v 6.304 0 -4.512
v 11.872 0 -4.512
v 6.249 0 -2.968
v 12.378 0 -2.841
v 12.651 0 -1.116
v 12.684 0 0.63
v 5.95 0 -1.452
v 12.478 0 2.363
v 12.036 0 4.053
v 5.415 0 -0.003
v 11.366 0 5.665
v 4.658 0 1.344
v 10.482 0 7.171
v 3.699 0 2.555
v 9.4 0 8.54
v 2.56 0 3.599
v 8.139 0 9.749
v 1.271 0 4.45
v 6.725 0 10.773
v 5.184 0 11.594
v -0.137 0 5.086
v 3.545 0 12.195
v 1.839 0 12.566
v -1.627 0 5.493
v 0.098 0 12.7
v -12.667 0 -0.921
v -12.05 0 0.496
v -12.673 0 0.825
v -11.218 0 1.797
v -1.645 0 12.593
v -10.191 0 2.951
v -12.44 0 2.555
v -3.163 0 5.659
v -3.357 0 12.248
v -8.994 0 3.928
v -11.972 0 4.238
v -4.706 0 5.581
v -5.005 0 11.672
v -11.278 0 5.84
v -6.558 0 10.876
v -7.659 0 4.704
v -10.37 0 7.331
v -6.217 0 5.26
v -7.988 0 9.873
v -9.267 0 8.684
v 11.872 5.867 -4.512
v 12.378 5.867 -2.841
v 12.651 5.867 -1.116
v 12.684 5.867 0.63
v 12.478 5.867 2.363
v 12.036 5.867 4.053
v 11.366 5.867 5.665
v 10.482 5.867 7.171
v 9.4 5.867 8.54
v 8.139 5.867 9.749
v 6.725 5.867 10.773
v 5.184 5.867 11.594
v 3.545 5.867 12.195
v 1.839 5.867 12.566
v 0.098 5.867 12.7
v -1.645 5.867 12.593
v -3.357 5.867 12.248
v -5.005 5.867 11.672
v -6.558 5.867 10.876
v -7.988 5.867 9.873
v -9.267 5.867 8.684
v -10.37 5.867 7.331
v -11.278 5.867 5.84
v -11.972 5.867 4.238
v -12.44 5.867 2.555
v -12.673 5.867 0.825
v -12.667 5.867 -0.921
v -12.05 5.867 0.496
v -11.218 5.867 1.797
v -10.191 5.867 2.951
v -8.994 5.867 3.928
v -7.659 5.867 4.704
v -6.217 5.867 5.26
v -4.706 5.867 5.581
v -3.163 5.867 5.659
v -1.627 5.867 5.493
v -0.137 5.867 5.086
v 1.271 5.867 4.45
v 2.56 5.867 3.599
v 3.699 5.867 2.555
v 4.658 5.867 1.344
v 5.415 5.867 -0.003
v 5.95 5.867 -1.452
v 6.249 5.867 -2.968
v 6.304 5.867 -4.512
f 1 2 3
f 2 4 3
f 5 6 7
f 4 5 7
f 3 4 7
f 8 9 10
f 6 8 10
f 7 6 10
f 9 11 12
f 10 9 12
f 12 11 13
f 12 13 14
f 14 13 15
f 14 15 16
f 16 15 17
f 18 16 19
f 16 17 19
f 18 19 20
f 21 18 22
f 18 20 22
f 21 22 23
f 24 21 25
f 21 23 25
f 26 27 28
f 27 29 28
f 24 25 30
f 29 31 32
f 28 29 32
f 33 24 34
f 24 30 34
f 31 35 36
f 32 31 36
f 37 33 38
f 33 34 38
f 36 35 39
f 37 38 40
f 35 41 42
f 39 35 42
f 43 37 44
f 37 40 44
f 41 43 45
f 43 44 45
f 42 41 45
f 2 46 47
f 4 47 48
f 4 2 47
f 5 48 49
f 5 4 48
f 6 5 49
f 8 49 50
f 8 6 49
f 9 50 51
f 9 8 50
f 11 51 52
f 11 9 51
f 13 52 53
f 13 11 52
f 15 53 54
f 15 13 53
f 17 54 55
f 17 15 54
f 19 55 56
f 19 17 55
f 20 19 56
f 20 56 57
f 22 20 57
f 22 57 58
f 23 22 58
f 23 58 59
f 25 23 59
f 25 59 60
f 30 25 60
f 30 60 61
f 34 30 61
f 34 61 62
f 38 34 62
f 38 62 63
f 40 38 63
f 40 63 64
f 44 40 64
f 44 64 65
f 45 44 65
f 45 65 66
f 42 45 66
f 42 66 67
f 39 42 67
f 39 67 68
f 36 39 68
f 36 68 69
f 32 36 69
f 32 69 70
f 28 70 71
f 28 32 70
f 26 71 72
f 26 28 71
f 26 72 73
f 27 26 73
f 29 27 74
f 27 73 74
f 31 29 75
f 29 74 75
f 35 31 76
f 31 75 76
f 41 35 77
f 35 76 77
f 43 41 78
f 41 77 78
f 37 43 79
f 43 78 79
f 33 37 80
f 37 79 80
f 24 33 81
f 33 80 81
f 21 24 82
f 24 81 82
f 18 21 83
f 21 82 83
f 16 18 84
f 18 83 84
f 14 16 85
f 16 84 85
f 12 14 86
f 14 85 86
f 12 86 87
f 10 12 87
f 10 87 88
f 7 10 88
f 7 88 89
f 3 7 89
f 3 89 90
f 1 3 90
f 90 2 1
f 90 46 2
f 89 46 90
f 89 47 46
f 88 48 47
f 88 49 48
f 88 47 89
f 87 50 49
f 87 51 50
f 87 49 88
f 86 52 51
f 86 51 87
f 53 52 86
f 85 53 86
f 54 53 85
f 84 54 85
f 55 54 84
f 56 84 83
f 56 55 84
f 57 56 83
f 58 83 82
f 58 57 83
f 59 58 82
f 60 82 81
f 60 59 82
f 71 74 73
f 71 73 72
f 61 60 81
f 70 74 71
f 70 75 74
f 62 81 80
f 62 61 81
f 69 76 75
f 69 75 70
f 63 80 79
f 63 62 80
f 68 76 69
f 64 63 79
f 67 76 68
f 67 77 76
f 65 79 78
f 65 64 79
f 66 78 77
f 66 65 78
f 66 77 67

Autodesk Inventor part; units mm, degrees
ref_plane "YZ Plane" through (0, 0, 0) normal (1, 0, 0) x (0, 1, 0)
ref_plane "XZ Plane" through (0, 0, 0) normal (0, 1, 0) x (-1, 0, 0)
ref_plane "XY Plane" through (0, 0, 0) normal (0, 0, 1) x (1, 0, 0)
sketch "Sketch1" plane through (0, 0, 0) normal (0, 1, 0) x (-1, 0, 0)
  circle A0 centre (0, 0) radius 12.7
  dimension "d0" = 25.4
extrude "Extrusion1" add sketch "Sketch1" along normal blind 5.8674
sketch "Sketch2" plane through (0, 5.8674, 0) normal (0, 1, 0) x (1, 0, 0)
  line L0 (0, 0) -> (-7.7692, 0)
  line L1 (-7.7692, 0) -> (-7.7692, 6.975)
  line L2 (-7.7692, 6.975) -> (0, 6.975)
  line L3 (0, 6.975) -> (0, 0)
extrude "Extrusion2" cut sketch "Sketch2" against normal blind 254
sketch "Sketch3" plane through (0, 5.8674, 0) normal (0, 1, 0) x (1, 0, 0)
  line L0 (0, 6.018) -> (5.0945, 6.018)
  line L1 (5.0945, 6.018) -> (5.0945, 4.5769)
  line L2 (5.0945, 4.5769) -> (0, 4.5769)
  line L3 (0, 4.5769) -> (0, 6.018)
  point P0 (0, 0)
extrude "Extrusion3" cut sketch "Sketch3" against normal blind 254
sketch "Sketch4" plane through (0, 5.8674, 0) normal (0, 1, 0) x (1, 0, 0)
  circle A0 centre (-2.0297, 0) radius 3.9608
  point P0 (0, 0)
extrude "Extrusion4" cut sketch "Sketch4" against normal blind 254
sketch "Sketch5" plane through (0, 5.8674, 0) normal (0, 1, 0) x (1, 0, 0)
  line L0 (12.2968, 4.5116) -> (-14.5211, 4.5116)
  line L1 (-14.5211, 4.5116) -> (-14.5211, 13.7027)
  line L2 (-14.5211, 13.7027) -> (12.2968, 13.7027)
  line L3 (12.2968, 13.7027) -> (12.2968, 4.5116)
  point P0 (0, 0)
extrude "Extrusion5" cut sketch "Sketch5" against normal blind 254
sketch "Sketch6" plane through (0, 5.8674, 0) normal (0, 1, 0) x (1, 0, 0)
  circle A0 centre (-3.4414, 4.0919) radius 9.7549
  point P0 (0, 0)
extrude "Extrusion6" cut sketch "Sketch6" against normal blind 254
properties part number "top hook"
